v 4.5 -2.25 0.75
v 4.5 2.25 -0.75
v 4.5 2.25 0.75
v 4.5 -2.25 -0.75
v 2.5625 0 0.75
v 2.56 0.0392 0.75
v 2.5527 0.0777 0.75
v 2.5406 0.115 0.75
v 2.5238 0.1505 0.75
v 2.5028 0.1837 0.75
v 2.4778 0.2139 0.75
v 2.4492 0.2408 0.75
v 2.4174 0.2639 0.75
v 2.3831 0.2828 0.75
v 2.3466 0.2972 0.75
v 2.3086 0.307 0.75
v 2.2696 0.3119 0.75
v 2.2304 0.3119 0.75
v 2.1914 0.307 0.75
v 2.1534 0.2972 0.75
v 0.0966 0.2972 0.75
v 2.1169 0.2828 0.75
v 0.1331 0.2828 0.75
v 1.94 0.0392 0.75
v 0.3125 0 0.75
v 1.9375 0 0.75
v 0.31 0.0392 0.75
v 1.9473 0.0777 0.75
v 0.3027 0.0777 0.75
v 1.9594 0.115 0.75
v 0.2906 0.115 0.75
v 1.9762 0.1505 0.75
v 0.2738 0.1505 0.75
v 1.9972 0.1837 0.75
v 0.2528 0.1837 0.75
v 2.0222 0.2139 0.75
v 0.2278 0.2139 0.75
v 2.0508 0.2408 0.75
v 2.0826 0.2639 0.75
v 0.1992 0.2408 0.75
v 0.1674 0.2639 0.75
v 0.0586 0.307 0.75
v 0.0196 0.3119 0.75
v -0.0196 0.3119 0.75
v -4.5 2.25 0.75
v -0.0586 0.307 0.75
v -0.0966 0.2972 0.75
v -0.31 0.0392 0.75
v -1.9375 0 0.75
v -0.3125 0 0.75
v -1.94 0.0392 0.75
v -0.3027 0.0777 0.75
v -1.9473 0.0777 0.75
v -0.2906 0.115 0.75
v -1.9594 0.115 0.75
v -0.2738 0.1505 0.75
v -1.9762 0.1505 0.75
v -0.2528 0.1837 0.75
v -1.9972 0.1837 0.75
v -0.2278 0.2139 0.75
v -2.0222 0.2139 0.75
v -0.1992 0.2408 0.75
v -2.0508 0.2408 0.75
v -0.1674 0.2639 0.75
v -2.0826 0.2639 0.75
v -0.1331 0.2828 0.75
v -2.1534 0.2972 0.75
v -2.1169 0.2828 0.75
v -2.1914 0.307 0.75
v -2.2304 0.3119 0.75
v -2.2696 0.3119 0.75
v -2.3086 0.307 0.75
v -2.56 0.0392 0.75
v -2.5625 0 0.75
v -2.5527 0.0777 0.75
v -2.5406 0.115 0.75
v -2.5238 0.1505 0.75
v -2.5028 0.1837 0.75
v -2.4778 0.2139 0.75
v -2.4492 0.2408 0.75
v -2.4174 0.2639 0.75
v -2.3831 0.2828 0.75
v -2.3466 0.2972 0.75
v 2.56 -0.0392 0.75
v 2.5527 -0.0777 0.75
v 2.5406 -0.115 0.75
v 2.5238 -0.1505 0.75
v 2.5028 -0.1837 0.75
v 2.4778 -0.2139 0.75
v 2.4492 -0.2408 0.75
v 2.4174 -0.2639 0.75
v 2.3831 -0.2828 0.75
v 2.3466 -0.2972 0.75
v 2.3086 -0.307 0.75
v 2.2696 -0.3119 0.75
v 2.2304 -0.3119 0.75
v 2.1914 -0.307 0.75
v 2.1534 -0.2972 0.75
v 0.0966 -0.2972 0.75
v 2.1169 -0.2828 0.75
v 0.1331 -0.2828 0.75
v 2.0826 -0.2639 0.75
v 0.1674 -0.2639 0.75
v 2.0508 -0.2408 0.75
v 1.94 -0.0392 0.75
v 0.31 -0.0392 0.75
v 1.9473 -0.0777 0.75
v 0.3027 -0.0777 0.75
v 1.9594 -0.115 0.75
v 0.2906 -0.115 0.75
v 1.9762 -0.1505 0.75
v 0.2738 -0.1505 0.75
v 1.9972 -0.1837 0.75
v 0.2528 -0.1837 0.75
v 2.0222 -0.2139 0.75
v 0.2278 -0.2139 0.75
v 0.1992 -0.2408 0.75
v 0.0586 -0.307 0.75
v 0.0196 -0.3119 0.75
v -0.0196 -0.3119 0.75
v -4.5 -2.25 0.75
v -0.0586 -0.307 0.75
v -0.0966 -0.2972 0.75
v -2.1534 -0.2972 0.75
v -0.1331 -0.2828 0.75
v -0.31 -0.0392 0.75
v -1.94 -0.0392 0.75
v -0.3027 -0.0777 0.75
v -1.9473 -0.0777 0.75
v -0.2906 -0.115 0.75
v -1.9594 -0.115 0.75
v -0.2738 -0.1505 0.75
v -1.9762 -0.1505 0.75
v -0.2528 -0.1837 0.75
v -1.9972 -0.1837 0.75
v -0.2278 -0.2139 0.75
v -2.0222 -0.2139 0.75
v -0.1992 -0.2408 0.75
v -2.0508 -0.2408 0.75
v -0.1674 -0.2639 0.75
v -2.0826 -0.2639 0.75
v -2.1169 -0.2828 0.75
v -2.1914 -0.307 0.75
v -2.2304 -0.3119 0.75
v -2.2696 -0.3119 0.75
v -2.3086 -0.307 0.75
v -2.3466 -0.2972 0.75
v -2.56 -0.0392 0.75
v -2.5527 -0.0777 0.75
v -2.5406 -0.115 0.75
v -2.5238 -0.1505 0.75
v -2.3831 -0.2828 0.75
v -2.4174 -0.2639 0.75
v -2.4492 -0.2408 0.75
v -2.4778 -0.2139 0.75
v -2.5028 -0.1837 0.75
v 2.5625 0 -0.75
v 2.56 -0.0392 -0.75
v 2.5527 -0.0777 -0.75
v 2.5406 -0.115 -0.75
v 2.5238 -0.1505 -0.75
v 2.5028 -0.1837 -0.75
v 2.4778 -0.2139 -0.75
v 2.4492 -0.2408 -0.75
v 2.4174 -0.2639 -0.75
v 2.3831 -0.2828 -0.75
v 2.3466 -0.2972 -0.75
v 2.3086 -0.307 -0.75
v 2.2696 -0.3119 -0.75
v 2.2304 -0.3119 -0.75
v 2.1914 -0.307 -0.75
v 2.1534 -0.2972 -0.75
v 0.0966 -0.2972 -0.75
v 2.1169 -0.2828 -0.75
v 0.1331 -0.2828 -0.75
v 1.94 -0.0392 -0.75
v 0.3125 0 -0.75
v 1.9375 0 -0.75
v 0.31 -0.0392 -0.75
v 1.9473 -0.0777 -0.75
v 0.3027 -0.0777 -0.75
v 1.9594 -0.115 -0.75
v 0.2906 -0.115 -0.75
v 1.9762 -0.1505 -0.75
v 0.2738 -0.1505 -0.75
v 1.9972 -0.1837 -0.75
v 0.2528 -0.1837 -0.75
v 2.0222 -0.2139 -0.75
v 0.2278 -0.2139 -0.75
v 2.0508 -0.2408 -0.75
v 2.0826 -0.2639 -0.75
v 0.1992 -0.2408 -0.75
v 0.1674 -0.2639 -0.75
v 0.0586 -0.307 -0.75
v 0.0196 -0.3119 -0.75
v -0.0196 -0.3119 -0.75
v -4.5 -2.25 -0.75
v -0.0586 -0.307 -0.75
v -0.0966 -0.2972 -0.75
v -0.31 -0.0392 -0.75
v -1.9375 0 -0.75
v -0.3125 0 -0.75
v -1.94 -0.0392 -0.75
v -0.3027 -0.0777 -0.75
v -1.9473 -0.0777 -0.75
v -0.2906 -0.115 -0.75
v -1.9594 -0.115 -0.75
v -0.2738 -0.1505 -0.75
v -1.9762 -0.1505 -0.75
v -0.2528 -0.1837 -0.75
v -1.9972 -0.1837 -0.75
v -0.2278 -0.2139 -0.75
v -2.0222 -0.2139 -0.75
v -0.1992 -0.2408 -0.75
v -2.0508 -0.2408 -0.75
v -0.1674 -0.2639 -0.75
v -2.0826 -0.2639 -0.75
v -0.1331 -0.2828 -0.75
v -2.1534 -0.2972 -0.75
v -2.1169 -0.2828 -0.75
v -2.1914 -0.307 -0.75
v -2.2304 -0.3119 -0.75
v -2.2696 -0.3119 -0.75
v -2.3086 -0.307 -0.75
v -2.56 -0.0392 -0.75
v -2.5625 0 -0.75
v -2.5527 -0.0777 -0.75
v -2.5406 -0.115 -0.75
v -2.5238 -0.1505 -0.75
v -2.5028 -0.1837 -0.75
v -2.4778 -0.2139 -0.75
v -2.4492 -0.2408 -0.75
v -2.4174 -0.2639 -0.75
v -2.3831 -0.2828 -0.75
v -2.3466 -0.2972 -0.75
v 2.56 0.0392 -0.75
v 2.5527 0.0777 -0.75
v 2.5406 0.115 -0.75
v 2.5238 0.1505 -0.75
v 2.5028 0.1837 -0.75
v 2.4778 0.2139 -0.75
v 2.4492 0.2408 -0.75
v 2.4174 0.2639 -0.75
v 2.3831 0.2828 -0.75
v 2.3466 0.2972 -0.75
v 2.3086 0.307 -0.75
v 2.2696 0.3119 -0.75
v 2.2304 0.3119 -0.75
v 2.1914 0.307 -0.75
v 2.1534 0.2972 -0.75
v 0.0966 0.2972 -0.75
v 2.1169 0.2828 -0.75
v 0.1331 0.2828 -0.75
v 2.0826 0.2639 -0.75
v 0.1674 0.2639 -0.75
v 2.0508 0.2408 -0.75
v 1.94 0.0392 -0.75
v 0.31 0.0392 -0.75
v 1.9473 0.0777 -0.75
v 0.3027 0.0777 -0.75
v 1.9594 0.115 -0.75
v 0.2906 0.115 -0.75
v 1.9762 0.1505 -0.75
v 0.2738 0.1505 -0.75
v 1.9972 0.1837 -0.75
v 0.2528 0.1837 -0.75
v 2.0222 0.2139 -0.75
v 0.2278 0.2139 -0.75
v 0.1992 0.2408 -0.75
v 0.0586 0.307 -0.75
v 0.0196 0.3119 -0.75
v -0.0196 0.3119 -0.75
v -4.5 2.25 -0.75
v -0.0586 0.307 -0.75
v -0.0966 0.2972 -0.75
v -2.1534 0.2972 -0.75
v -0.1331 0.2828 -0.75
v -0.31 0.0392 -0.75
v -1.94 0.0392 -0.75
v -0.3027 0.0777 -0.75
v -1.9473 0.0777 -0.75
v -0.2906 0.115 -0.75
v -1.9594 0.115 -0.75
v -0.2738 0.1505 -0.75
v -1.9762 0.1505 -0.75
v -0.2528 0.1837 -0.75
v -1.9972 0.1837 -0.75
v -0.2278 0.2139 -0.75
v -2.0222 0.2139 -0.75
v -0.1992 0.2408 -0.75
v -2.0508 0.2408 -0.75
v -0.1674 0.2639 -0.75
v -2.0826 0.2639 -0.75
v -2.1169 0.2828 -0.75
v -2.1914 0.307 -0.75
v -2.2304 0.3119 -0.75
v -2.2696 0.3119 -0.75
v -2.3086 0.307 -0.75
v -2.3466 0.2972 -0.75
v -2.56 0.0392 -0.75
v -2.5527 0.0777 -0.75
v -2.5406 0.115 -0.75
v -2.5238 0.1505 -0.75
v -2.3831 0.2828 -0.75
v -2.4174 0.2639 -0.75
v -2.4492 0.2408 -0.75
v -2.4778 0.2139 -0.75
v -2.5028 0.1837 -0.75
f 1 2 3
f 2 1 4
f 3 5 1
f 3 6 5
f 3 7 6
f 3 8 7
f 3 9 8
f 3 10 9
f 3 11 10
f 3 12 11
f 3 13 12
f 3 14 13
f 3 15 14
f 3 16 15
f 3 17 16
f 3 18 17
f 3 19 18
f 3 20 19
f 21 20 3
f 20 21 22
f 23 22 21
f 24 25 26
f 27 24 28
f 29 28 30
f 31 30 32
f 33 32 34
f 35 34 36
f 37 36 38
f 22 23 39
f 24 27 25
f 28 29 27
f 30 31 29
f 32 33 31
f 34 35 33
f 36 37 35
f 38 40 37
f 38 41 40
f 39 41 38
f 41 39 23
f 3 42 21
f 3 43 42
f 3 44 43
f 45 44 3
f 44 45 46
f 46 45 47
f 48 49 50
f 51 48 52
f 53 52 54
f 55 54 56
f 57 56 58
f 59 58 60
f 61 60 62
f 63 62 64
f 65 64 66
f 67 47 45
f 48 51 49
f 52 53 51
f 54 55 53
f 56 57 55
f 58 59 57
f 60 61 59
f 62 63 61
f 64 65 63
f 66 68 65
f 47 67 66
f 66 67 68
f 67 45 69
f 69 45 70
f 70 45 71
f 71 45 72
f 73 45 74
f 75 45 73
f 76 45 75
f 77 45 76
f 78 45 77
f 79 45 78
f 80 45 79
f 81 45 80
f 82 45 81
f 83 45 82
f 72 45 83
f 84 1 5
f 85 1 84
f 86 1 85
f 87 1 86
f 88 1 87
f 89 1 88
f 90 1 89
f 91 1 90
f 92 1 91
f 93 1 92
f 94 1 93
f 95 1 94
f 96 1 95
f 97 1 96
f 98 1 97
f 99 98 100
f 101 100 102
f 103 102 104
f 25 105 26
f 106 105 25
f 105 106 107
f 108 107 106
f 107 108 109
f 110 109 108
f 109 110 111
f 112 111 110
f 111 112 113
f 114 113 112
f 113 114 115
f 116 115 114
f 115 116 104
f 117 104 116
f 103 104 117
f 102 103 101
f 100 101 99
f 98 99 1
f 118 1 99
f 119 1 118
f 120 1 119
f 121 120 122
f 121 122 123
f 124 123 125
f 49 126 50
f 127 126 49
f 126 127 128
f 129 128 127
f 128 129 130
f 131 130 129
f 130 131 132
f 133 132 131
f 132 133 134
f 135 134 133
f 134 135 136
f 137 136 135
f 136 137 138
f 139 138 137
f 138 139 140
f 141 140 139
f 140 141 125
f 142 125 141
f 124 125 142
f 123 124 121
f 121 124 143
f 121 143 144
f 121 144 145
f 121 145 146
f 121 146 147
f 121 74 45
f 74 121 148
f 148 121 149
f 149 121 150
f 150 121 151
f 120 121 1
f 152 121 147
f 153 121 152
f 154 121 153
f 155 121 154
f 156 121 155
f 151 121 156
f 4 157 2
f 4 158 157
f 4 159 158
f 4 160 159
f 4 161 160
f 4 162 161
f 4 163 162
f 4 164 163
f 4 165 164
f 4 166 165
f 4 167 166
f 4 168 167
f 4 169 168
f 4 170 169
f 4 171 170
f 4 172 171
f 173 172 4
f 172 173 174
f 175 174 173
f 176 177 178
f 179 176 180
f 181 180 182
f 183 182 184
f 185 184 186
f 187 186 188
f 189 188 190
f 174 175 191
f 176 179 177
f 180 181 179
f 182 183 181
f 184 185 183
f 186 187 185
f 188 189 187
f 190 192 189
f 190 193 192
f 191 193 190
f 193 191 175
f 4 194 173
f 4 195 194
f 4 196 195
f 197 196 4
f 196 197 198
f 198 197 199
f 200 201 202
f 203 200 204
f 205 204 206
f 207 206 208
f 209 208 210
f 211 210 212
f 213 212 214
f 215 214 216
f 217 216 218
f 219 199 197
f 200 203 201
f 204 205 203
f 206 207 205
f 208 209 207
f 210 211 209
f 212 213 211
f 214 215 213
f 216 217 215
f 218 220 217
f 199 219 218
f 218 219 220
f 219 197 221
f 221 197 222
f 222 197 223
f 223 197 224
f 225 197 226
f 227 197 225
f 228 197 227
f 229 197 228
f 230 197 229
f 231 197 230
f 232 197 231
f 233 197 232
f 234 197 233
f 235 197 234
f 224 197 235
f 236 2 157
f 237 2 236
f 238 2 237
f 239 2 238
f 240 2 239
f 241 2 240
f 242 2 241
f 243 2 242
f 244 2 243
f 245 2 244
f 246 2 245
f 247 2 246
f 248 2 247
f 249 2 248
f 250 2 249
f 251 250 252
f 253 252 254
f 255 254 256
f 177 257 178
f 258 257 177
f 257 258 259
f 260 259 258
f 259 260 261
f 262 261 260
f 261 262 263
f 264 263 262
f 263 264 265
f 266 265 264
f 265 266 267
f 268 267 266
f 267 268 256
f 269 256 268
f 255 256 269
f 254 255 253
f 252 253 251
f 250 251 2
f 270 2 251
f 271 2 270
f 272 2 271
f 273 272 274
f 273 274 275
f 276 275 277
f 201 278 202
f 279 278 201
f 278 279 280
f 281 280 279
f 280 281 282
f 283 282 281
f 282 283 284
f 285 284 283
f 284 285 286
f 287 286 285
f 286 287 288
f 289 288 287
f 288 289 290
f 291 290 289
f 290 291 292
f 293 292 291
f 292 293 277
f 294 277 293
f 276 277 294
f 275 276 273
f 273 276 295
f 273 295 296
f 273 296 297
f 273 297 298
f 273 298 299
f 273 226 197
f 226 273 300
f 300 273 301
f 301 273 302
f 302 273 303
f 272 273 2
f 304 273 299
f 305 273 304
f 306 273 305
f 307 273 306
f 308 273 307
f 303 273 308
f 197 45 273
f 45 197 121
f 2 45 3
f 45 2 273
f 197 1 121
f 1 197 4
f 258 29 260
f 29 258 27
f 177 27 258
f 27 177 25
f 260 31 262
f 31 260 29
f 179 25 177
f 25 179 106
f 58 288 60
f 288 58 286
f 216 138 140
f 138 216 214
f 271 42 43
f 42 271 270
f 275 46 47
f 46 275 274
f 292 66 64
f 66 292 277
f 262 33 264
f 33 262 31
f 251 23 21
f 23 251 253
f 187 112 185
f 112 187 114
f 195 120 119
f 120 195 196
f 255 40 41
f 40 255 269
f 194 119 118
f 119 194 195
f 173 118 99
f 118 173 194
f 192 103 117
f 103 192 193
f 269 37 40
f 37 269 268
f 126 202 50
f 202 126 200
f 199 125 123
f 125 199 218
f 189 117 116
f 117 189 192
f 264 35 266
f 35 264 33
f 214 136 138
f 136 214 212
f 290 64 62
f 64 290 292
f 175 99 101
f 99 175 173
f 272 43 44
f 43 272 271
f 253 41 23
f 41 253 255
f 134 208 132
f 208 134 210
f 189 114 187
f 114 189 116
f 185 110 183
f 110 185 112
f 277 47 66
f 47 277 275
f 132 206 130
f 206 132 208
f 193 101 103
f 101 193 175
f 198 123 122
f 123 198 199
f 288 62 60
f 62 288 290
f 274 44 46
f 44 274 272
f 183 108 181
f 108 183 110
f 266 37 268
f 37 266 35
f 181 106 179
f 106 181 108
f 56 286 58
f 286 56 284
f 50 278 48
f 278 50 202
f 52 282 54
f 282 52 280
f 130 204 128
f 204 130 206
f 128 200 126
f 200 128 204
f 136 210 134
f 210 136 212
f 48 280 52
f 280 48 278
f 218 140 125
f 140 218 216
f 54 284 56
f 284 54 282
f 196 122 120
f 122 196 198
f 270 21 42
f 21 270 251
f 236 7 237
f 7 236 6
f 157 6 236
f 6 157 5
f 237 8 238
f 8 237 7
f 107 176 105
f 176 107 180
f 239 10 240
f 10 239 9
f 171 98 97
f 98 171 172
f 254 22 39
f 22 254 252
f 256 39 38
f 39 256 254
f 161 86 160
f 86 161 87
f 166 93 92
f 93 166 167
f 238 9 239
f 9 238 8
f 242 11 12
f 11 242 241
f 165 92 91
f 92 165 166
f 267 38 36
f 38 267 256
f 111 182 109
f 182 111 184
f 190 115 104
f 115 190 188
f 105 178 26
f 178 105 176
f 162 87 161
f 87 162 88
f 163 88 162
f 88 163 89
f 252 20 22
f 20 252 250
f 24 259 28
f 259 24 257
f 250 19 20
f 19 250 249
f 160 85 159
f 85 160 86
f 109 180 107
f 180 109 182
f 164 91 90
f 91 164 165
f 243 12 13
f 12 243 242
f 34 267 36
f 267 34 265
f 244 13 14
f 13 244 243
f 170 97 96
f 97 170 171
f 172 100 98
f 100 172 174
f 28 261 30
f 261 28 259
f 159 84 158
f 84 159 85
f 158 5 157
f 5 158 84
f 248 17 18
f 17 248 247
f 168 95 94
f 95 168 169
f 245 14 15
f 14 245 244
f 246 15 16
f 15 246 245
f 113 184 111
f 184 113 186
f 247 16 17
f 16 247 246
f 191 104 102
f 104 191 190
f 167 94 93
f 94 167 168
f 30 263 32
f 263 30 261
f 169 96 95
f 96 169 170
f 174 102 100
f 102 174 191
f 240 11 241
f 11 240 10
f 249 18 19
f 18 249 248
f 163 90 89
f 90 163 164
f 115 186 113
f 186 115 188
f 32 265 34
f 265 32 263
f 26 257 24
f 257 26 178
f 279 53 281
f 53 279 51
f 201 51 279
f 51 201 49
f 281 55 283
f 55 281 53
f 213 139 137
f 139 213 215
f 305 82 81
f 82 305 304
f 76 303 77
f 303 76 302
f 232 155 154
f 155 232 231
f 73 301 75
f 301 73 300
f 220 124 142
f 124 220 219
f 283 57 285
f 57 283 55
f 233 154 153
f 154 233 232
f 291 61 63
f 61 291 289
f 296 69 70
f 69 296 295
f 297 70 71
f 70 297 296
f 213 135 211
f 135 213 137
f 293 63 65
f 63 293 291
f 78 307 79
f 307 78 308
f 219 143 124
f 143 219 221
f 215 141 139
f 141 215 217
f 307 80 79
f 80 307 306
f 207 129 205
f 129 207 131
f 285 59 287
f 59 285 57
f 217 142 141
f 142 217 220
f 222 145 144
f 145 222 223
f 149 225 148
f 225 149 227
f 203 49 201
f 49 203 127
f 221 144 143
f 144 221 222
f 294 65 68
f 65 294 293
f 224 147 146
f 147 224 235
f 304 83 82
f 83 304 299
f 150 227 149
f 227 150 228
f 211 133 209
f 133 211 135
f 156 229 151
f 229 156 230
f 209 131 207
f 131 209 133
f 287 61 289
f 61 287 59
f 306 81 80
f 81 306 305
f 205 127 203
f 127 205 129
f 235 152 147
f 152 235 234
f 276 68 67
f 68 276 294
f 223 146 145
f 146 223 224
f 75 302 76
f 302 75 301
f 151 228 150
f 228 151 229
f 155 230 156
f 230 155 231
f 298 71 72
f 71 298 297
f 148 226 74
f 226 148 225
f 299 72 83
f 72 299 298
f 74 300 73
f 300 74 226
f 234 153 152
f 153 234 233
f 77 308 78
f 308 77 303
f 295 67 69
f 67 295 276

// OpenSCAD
module brick(bl, bw, bh, bhd) 
{
    difference()
    {
    cube([bl, bw, bh], center=true);
        cylinder(h = bh*1.1, r=bhd/2, center=true);
        translate([bw/2,0,0])
                cylinder(h = bh*1.1, r=bhd/2, center=true);
        translate([-bw/2,0,0])
                cylinder(h = bh*1.1, r=bhd/2, center=true);
    }
}

module layer(bl, bw, bh, bhd)
{
    translate([0, 3/2*bw, bh/2])
       brick(bl, bw, bh, bhd);
    translate([0, -3/2*bw, bh/2])
       brick(bl, bw, bh, bhd);
    translate([3/2*bw, bl/2, bh/2])
        rotate([0,0,90])
            brick(bl, bw, bh, bhd);
    translate([-3/2*bw, bl/2, bh/2])
        rotate([0,0,90])
            brick(bl, bw, bh, bhd);
    translate([3/2*bw, -bl/2, bh/2])
        rotate([0,0,90])
            brick(bl, bw, bh, bhd);
     translate([-3/2*bw, -bl/2, bh/2])
        rotate([0,0,90])
            brick(bl, bw, bh, bhd);
}

module base(bl, bw, bh, bhd)
{
    translate([bl/2, 3/2*bw, bh/2])
        //rotate([0,0,90])
            brick(bl, bw, bh, bhd);
    translate([bl/2,-3/2*bw, bh/2])
        //rotate([0,0,90])
            brick(bl, bw, bh, bhd);
    translate([-bl/2, 3/2*bw, bh/2])
        //rotate([0,0,90])
            brick(bl, bw, bh, bhd);
     translate([-bl/2, -3/2*bw, bh/2])
        //rotate([0,0,90])
            brick(bl, bw, bh, bhd);
        translate([bl/2, 1/2*bw, bh/2])
        //rotate([0,0,90])
            brick(bl, bw, bh, bhd);
        translate([bl/2, -1/2*bw, bh/2])
        //rotate([0,0,90])
            brick(bl, bw, bh, bhd);
        translate([-bl/2, 1/2*bw, bh/2])
        //rotate([0,0,90])
            brick(bl, bw, bh, bhd);
        translate([-bl/2, -1/2*bw, bh/2])
        //rotate([0,0,90])
            brick(bl, bw, bh, bhd);

    
    
}

$fn = 50;
bl = 9;
bw = 4.5;
bh = 1.5;
bhd = 5/8;
color([0.4,0.3,0.2])
brick(bl, bw, bh, bhd);
